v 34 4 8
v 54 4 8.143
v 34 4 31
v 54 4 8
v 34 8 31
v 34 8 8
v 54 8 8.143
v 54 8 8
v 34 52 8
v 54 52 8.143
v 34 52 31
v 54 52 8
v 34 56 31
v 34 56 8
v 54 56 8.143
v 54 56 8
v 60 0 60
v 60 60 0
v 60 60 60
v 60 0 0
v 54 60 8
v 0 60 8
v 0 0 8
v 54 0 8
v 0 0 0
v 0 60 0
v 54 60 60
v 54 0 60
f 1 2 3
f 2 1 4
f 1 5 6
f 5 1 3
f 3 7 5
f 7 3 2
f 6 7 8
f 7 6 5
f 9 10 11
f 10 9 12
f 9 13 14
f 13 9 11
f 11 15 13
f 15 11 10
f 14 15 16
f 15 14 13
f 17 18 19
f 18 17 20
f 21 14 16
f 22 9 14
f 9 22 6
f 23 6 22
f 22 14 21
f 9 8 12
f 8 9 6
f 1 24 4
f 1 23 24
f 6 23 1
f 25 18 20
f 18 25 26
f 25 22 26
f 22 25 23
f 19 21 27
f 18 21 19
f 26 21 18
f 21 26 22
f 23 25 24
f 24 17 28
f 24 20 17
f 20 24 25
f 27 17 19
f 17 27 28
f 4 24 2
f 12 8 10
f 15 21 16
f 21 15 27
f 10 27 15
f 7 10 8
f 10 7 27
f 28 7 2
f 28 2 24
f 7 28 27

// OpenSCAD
$fn = 32;

// ----------------------------------------------------------------------
// Rib bracket: 2-gusset L bracket
// ----------------------------------------------------------------------

// --- parameters (mm) ---
base_l = 60;              // foot length, X
base_w = 60;              // foot width, Y
base_t = 8;               // foot thickness
plate_t = 6;              // upright plate thickness
plate_h = 60;             // overall height
gus_l = 20;               // gusset leg along the foot
gus_h = 24;               // gusset height
gus_t = 4;                // gusset thickness
gus_edge = 4;             // gusset margin from the foot edge
n_gus = 2;                // gusset count

gus_pitch = (base_w - 2 * gus_edge - gus_t) / (n_gus - 1);  // gusset pitch

union() {
  cube([base_l, base_w, base_t]);
  translate([base_l - plate_t, 0, base_t - 1])
    cube([plate_t, base_w, plate_h - base_t + 1]);
  for (i = [0 : n_gus - 1])
    translate([base_l - plate_t - gus_l, gus_edge + i * gus_pitch, base_t - 1])
      rotate([-90, 0, 0])
        linear_extrude(height = gus_t)
          polygon(points = [[0, 0], [gus_l + 1, 0], [0, -gus_h]]);
}
